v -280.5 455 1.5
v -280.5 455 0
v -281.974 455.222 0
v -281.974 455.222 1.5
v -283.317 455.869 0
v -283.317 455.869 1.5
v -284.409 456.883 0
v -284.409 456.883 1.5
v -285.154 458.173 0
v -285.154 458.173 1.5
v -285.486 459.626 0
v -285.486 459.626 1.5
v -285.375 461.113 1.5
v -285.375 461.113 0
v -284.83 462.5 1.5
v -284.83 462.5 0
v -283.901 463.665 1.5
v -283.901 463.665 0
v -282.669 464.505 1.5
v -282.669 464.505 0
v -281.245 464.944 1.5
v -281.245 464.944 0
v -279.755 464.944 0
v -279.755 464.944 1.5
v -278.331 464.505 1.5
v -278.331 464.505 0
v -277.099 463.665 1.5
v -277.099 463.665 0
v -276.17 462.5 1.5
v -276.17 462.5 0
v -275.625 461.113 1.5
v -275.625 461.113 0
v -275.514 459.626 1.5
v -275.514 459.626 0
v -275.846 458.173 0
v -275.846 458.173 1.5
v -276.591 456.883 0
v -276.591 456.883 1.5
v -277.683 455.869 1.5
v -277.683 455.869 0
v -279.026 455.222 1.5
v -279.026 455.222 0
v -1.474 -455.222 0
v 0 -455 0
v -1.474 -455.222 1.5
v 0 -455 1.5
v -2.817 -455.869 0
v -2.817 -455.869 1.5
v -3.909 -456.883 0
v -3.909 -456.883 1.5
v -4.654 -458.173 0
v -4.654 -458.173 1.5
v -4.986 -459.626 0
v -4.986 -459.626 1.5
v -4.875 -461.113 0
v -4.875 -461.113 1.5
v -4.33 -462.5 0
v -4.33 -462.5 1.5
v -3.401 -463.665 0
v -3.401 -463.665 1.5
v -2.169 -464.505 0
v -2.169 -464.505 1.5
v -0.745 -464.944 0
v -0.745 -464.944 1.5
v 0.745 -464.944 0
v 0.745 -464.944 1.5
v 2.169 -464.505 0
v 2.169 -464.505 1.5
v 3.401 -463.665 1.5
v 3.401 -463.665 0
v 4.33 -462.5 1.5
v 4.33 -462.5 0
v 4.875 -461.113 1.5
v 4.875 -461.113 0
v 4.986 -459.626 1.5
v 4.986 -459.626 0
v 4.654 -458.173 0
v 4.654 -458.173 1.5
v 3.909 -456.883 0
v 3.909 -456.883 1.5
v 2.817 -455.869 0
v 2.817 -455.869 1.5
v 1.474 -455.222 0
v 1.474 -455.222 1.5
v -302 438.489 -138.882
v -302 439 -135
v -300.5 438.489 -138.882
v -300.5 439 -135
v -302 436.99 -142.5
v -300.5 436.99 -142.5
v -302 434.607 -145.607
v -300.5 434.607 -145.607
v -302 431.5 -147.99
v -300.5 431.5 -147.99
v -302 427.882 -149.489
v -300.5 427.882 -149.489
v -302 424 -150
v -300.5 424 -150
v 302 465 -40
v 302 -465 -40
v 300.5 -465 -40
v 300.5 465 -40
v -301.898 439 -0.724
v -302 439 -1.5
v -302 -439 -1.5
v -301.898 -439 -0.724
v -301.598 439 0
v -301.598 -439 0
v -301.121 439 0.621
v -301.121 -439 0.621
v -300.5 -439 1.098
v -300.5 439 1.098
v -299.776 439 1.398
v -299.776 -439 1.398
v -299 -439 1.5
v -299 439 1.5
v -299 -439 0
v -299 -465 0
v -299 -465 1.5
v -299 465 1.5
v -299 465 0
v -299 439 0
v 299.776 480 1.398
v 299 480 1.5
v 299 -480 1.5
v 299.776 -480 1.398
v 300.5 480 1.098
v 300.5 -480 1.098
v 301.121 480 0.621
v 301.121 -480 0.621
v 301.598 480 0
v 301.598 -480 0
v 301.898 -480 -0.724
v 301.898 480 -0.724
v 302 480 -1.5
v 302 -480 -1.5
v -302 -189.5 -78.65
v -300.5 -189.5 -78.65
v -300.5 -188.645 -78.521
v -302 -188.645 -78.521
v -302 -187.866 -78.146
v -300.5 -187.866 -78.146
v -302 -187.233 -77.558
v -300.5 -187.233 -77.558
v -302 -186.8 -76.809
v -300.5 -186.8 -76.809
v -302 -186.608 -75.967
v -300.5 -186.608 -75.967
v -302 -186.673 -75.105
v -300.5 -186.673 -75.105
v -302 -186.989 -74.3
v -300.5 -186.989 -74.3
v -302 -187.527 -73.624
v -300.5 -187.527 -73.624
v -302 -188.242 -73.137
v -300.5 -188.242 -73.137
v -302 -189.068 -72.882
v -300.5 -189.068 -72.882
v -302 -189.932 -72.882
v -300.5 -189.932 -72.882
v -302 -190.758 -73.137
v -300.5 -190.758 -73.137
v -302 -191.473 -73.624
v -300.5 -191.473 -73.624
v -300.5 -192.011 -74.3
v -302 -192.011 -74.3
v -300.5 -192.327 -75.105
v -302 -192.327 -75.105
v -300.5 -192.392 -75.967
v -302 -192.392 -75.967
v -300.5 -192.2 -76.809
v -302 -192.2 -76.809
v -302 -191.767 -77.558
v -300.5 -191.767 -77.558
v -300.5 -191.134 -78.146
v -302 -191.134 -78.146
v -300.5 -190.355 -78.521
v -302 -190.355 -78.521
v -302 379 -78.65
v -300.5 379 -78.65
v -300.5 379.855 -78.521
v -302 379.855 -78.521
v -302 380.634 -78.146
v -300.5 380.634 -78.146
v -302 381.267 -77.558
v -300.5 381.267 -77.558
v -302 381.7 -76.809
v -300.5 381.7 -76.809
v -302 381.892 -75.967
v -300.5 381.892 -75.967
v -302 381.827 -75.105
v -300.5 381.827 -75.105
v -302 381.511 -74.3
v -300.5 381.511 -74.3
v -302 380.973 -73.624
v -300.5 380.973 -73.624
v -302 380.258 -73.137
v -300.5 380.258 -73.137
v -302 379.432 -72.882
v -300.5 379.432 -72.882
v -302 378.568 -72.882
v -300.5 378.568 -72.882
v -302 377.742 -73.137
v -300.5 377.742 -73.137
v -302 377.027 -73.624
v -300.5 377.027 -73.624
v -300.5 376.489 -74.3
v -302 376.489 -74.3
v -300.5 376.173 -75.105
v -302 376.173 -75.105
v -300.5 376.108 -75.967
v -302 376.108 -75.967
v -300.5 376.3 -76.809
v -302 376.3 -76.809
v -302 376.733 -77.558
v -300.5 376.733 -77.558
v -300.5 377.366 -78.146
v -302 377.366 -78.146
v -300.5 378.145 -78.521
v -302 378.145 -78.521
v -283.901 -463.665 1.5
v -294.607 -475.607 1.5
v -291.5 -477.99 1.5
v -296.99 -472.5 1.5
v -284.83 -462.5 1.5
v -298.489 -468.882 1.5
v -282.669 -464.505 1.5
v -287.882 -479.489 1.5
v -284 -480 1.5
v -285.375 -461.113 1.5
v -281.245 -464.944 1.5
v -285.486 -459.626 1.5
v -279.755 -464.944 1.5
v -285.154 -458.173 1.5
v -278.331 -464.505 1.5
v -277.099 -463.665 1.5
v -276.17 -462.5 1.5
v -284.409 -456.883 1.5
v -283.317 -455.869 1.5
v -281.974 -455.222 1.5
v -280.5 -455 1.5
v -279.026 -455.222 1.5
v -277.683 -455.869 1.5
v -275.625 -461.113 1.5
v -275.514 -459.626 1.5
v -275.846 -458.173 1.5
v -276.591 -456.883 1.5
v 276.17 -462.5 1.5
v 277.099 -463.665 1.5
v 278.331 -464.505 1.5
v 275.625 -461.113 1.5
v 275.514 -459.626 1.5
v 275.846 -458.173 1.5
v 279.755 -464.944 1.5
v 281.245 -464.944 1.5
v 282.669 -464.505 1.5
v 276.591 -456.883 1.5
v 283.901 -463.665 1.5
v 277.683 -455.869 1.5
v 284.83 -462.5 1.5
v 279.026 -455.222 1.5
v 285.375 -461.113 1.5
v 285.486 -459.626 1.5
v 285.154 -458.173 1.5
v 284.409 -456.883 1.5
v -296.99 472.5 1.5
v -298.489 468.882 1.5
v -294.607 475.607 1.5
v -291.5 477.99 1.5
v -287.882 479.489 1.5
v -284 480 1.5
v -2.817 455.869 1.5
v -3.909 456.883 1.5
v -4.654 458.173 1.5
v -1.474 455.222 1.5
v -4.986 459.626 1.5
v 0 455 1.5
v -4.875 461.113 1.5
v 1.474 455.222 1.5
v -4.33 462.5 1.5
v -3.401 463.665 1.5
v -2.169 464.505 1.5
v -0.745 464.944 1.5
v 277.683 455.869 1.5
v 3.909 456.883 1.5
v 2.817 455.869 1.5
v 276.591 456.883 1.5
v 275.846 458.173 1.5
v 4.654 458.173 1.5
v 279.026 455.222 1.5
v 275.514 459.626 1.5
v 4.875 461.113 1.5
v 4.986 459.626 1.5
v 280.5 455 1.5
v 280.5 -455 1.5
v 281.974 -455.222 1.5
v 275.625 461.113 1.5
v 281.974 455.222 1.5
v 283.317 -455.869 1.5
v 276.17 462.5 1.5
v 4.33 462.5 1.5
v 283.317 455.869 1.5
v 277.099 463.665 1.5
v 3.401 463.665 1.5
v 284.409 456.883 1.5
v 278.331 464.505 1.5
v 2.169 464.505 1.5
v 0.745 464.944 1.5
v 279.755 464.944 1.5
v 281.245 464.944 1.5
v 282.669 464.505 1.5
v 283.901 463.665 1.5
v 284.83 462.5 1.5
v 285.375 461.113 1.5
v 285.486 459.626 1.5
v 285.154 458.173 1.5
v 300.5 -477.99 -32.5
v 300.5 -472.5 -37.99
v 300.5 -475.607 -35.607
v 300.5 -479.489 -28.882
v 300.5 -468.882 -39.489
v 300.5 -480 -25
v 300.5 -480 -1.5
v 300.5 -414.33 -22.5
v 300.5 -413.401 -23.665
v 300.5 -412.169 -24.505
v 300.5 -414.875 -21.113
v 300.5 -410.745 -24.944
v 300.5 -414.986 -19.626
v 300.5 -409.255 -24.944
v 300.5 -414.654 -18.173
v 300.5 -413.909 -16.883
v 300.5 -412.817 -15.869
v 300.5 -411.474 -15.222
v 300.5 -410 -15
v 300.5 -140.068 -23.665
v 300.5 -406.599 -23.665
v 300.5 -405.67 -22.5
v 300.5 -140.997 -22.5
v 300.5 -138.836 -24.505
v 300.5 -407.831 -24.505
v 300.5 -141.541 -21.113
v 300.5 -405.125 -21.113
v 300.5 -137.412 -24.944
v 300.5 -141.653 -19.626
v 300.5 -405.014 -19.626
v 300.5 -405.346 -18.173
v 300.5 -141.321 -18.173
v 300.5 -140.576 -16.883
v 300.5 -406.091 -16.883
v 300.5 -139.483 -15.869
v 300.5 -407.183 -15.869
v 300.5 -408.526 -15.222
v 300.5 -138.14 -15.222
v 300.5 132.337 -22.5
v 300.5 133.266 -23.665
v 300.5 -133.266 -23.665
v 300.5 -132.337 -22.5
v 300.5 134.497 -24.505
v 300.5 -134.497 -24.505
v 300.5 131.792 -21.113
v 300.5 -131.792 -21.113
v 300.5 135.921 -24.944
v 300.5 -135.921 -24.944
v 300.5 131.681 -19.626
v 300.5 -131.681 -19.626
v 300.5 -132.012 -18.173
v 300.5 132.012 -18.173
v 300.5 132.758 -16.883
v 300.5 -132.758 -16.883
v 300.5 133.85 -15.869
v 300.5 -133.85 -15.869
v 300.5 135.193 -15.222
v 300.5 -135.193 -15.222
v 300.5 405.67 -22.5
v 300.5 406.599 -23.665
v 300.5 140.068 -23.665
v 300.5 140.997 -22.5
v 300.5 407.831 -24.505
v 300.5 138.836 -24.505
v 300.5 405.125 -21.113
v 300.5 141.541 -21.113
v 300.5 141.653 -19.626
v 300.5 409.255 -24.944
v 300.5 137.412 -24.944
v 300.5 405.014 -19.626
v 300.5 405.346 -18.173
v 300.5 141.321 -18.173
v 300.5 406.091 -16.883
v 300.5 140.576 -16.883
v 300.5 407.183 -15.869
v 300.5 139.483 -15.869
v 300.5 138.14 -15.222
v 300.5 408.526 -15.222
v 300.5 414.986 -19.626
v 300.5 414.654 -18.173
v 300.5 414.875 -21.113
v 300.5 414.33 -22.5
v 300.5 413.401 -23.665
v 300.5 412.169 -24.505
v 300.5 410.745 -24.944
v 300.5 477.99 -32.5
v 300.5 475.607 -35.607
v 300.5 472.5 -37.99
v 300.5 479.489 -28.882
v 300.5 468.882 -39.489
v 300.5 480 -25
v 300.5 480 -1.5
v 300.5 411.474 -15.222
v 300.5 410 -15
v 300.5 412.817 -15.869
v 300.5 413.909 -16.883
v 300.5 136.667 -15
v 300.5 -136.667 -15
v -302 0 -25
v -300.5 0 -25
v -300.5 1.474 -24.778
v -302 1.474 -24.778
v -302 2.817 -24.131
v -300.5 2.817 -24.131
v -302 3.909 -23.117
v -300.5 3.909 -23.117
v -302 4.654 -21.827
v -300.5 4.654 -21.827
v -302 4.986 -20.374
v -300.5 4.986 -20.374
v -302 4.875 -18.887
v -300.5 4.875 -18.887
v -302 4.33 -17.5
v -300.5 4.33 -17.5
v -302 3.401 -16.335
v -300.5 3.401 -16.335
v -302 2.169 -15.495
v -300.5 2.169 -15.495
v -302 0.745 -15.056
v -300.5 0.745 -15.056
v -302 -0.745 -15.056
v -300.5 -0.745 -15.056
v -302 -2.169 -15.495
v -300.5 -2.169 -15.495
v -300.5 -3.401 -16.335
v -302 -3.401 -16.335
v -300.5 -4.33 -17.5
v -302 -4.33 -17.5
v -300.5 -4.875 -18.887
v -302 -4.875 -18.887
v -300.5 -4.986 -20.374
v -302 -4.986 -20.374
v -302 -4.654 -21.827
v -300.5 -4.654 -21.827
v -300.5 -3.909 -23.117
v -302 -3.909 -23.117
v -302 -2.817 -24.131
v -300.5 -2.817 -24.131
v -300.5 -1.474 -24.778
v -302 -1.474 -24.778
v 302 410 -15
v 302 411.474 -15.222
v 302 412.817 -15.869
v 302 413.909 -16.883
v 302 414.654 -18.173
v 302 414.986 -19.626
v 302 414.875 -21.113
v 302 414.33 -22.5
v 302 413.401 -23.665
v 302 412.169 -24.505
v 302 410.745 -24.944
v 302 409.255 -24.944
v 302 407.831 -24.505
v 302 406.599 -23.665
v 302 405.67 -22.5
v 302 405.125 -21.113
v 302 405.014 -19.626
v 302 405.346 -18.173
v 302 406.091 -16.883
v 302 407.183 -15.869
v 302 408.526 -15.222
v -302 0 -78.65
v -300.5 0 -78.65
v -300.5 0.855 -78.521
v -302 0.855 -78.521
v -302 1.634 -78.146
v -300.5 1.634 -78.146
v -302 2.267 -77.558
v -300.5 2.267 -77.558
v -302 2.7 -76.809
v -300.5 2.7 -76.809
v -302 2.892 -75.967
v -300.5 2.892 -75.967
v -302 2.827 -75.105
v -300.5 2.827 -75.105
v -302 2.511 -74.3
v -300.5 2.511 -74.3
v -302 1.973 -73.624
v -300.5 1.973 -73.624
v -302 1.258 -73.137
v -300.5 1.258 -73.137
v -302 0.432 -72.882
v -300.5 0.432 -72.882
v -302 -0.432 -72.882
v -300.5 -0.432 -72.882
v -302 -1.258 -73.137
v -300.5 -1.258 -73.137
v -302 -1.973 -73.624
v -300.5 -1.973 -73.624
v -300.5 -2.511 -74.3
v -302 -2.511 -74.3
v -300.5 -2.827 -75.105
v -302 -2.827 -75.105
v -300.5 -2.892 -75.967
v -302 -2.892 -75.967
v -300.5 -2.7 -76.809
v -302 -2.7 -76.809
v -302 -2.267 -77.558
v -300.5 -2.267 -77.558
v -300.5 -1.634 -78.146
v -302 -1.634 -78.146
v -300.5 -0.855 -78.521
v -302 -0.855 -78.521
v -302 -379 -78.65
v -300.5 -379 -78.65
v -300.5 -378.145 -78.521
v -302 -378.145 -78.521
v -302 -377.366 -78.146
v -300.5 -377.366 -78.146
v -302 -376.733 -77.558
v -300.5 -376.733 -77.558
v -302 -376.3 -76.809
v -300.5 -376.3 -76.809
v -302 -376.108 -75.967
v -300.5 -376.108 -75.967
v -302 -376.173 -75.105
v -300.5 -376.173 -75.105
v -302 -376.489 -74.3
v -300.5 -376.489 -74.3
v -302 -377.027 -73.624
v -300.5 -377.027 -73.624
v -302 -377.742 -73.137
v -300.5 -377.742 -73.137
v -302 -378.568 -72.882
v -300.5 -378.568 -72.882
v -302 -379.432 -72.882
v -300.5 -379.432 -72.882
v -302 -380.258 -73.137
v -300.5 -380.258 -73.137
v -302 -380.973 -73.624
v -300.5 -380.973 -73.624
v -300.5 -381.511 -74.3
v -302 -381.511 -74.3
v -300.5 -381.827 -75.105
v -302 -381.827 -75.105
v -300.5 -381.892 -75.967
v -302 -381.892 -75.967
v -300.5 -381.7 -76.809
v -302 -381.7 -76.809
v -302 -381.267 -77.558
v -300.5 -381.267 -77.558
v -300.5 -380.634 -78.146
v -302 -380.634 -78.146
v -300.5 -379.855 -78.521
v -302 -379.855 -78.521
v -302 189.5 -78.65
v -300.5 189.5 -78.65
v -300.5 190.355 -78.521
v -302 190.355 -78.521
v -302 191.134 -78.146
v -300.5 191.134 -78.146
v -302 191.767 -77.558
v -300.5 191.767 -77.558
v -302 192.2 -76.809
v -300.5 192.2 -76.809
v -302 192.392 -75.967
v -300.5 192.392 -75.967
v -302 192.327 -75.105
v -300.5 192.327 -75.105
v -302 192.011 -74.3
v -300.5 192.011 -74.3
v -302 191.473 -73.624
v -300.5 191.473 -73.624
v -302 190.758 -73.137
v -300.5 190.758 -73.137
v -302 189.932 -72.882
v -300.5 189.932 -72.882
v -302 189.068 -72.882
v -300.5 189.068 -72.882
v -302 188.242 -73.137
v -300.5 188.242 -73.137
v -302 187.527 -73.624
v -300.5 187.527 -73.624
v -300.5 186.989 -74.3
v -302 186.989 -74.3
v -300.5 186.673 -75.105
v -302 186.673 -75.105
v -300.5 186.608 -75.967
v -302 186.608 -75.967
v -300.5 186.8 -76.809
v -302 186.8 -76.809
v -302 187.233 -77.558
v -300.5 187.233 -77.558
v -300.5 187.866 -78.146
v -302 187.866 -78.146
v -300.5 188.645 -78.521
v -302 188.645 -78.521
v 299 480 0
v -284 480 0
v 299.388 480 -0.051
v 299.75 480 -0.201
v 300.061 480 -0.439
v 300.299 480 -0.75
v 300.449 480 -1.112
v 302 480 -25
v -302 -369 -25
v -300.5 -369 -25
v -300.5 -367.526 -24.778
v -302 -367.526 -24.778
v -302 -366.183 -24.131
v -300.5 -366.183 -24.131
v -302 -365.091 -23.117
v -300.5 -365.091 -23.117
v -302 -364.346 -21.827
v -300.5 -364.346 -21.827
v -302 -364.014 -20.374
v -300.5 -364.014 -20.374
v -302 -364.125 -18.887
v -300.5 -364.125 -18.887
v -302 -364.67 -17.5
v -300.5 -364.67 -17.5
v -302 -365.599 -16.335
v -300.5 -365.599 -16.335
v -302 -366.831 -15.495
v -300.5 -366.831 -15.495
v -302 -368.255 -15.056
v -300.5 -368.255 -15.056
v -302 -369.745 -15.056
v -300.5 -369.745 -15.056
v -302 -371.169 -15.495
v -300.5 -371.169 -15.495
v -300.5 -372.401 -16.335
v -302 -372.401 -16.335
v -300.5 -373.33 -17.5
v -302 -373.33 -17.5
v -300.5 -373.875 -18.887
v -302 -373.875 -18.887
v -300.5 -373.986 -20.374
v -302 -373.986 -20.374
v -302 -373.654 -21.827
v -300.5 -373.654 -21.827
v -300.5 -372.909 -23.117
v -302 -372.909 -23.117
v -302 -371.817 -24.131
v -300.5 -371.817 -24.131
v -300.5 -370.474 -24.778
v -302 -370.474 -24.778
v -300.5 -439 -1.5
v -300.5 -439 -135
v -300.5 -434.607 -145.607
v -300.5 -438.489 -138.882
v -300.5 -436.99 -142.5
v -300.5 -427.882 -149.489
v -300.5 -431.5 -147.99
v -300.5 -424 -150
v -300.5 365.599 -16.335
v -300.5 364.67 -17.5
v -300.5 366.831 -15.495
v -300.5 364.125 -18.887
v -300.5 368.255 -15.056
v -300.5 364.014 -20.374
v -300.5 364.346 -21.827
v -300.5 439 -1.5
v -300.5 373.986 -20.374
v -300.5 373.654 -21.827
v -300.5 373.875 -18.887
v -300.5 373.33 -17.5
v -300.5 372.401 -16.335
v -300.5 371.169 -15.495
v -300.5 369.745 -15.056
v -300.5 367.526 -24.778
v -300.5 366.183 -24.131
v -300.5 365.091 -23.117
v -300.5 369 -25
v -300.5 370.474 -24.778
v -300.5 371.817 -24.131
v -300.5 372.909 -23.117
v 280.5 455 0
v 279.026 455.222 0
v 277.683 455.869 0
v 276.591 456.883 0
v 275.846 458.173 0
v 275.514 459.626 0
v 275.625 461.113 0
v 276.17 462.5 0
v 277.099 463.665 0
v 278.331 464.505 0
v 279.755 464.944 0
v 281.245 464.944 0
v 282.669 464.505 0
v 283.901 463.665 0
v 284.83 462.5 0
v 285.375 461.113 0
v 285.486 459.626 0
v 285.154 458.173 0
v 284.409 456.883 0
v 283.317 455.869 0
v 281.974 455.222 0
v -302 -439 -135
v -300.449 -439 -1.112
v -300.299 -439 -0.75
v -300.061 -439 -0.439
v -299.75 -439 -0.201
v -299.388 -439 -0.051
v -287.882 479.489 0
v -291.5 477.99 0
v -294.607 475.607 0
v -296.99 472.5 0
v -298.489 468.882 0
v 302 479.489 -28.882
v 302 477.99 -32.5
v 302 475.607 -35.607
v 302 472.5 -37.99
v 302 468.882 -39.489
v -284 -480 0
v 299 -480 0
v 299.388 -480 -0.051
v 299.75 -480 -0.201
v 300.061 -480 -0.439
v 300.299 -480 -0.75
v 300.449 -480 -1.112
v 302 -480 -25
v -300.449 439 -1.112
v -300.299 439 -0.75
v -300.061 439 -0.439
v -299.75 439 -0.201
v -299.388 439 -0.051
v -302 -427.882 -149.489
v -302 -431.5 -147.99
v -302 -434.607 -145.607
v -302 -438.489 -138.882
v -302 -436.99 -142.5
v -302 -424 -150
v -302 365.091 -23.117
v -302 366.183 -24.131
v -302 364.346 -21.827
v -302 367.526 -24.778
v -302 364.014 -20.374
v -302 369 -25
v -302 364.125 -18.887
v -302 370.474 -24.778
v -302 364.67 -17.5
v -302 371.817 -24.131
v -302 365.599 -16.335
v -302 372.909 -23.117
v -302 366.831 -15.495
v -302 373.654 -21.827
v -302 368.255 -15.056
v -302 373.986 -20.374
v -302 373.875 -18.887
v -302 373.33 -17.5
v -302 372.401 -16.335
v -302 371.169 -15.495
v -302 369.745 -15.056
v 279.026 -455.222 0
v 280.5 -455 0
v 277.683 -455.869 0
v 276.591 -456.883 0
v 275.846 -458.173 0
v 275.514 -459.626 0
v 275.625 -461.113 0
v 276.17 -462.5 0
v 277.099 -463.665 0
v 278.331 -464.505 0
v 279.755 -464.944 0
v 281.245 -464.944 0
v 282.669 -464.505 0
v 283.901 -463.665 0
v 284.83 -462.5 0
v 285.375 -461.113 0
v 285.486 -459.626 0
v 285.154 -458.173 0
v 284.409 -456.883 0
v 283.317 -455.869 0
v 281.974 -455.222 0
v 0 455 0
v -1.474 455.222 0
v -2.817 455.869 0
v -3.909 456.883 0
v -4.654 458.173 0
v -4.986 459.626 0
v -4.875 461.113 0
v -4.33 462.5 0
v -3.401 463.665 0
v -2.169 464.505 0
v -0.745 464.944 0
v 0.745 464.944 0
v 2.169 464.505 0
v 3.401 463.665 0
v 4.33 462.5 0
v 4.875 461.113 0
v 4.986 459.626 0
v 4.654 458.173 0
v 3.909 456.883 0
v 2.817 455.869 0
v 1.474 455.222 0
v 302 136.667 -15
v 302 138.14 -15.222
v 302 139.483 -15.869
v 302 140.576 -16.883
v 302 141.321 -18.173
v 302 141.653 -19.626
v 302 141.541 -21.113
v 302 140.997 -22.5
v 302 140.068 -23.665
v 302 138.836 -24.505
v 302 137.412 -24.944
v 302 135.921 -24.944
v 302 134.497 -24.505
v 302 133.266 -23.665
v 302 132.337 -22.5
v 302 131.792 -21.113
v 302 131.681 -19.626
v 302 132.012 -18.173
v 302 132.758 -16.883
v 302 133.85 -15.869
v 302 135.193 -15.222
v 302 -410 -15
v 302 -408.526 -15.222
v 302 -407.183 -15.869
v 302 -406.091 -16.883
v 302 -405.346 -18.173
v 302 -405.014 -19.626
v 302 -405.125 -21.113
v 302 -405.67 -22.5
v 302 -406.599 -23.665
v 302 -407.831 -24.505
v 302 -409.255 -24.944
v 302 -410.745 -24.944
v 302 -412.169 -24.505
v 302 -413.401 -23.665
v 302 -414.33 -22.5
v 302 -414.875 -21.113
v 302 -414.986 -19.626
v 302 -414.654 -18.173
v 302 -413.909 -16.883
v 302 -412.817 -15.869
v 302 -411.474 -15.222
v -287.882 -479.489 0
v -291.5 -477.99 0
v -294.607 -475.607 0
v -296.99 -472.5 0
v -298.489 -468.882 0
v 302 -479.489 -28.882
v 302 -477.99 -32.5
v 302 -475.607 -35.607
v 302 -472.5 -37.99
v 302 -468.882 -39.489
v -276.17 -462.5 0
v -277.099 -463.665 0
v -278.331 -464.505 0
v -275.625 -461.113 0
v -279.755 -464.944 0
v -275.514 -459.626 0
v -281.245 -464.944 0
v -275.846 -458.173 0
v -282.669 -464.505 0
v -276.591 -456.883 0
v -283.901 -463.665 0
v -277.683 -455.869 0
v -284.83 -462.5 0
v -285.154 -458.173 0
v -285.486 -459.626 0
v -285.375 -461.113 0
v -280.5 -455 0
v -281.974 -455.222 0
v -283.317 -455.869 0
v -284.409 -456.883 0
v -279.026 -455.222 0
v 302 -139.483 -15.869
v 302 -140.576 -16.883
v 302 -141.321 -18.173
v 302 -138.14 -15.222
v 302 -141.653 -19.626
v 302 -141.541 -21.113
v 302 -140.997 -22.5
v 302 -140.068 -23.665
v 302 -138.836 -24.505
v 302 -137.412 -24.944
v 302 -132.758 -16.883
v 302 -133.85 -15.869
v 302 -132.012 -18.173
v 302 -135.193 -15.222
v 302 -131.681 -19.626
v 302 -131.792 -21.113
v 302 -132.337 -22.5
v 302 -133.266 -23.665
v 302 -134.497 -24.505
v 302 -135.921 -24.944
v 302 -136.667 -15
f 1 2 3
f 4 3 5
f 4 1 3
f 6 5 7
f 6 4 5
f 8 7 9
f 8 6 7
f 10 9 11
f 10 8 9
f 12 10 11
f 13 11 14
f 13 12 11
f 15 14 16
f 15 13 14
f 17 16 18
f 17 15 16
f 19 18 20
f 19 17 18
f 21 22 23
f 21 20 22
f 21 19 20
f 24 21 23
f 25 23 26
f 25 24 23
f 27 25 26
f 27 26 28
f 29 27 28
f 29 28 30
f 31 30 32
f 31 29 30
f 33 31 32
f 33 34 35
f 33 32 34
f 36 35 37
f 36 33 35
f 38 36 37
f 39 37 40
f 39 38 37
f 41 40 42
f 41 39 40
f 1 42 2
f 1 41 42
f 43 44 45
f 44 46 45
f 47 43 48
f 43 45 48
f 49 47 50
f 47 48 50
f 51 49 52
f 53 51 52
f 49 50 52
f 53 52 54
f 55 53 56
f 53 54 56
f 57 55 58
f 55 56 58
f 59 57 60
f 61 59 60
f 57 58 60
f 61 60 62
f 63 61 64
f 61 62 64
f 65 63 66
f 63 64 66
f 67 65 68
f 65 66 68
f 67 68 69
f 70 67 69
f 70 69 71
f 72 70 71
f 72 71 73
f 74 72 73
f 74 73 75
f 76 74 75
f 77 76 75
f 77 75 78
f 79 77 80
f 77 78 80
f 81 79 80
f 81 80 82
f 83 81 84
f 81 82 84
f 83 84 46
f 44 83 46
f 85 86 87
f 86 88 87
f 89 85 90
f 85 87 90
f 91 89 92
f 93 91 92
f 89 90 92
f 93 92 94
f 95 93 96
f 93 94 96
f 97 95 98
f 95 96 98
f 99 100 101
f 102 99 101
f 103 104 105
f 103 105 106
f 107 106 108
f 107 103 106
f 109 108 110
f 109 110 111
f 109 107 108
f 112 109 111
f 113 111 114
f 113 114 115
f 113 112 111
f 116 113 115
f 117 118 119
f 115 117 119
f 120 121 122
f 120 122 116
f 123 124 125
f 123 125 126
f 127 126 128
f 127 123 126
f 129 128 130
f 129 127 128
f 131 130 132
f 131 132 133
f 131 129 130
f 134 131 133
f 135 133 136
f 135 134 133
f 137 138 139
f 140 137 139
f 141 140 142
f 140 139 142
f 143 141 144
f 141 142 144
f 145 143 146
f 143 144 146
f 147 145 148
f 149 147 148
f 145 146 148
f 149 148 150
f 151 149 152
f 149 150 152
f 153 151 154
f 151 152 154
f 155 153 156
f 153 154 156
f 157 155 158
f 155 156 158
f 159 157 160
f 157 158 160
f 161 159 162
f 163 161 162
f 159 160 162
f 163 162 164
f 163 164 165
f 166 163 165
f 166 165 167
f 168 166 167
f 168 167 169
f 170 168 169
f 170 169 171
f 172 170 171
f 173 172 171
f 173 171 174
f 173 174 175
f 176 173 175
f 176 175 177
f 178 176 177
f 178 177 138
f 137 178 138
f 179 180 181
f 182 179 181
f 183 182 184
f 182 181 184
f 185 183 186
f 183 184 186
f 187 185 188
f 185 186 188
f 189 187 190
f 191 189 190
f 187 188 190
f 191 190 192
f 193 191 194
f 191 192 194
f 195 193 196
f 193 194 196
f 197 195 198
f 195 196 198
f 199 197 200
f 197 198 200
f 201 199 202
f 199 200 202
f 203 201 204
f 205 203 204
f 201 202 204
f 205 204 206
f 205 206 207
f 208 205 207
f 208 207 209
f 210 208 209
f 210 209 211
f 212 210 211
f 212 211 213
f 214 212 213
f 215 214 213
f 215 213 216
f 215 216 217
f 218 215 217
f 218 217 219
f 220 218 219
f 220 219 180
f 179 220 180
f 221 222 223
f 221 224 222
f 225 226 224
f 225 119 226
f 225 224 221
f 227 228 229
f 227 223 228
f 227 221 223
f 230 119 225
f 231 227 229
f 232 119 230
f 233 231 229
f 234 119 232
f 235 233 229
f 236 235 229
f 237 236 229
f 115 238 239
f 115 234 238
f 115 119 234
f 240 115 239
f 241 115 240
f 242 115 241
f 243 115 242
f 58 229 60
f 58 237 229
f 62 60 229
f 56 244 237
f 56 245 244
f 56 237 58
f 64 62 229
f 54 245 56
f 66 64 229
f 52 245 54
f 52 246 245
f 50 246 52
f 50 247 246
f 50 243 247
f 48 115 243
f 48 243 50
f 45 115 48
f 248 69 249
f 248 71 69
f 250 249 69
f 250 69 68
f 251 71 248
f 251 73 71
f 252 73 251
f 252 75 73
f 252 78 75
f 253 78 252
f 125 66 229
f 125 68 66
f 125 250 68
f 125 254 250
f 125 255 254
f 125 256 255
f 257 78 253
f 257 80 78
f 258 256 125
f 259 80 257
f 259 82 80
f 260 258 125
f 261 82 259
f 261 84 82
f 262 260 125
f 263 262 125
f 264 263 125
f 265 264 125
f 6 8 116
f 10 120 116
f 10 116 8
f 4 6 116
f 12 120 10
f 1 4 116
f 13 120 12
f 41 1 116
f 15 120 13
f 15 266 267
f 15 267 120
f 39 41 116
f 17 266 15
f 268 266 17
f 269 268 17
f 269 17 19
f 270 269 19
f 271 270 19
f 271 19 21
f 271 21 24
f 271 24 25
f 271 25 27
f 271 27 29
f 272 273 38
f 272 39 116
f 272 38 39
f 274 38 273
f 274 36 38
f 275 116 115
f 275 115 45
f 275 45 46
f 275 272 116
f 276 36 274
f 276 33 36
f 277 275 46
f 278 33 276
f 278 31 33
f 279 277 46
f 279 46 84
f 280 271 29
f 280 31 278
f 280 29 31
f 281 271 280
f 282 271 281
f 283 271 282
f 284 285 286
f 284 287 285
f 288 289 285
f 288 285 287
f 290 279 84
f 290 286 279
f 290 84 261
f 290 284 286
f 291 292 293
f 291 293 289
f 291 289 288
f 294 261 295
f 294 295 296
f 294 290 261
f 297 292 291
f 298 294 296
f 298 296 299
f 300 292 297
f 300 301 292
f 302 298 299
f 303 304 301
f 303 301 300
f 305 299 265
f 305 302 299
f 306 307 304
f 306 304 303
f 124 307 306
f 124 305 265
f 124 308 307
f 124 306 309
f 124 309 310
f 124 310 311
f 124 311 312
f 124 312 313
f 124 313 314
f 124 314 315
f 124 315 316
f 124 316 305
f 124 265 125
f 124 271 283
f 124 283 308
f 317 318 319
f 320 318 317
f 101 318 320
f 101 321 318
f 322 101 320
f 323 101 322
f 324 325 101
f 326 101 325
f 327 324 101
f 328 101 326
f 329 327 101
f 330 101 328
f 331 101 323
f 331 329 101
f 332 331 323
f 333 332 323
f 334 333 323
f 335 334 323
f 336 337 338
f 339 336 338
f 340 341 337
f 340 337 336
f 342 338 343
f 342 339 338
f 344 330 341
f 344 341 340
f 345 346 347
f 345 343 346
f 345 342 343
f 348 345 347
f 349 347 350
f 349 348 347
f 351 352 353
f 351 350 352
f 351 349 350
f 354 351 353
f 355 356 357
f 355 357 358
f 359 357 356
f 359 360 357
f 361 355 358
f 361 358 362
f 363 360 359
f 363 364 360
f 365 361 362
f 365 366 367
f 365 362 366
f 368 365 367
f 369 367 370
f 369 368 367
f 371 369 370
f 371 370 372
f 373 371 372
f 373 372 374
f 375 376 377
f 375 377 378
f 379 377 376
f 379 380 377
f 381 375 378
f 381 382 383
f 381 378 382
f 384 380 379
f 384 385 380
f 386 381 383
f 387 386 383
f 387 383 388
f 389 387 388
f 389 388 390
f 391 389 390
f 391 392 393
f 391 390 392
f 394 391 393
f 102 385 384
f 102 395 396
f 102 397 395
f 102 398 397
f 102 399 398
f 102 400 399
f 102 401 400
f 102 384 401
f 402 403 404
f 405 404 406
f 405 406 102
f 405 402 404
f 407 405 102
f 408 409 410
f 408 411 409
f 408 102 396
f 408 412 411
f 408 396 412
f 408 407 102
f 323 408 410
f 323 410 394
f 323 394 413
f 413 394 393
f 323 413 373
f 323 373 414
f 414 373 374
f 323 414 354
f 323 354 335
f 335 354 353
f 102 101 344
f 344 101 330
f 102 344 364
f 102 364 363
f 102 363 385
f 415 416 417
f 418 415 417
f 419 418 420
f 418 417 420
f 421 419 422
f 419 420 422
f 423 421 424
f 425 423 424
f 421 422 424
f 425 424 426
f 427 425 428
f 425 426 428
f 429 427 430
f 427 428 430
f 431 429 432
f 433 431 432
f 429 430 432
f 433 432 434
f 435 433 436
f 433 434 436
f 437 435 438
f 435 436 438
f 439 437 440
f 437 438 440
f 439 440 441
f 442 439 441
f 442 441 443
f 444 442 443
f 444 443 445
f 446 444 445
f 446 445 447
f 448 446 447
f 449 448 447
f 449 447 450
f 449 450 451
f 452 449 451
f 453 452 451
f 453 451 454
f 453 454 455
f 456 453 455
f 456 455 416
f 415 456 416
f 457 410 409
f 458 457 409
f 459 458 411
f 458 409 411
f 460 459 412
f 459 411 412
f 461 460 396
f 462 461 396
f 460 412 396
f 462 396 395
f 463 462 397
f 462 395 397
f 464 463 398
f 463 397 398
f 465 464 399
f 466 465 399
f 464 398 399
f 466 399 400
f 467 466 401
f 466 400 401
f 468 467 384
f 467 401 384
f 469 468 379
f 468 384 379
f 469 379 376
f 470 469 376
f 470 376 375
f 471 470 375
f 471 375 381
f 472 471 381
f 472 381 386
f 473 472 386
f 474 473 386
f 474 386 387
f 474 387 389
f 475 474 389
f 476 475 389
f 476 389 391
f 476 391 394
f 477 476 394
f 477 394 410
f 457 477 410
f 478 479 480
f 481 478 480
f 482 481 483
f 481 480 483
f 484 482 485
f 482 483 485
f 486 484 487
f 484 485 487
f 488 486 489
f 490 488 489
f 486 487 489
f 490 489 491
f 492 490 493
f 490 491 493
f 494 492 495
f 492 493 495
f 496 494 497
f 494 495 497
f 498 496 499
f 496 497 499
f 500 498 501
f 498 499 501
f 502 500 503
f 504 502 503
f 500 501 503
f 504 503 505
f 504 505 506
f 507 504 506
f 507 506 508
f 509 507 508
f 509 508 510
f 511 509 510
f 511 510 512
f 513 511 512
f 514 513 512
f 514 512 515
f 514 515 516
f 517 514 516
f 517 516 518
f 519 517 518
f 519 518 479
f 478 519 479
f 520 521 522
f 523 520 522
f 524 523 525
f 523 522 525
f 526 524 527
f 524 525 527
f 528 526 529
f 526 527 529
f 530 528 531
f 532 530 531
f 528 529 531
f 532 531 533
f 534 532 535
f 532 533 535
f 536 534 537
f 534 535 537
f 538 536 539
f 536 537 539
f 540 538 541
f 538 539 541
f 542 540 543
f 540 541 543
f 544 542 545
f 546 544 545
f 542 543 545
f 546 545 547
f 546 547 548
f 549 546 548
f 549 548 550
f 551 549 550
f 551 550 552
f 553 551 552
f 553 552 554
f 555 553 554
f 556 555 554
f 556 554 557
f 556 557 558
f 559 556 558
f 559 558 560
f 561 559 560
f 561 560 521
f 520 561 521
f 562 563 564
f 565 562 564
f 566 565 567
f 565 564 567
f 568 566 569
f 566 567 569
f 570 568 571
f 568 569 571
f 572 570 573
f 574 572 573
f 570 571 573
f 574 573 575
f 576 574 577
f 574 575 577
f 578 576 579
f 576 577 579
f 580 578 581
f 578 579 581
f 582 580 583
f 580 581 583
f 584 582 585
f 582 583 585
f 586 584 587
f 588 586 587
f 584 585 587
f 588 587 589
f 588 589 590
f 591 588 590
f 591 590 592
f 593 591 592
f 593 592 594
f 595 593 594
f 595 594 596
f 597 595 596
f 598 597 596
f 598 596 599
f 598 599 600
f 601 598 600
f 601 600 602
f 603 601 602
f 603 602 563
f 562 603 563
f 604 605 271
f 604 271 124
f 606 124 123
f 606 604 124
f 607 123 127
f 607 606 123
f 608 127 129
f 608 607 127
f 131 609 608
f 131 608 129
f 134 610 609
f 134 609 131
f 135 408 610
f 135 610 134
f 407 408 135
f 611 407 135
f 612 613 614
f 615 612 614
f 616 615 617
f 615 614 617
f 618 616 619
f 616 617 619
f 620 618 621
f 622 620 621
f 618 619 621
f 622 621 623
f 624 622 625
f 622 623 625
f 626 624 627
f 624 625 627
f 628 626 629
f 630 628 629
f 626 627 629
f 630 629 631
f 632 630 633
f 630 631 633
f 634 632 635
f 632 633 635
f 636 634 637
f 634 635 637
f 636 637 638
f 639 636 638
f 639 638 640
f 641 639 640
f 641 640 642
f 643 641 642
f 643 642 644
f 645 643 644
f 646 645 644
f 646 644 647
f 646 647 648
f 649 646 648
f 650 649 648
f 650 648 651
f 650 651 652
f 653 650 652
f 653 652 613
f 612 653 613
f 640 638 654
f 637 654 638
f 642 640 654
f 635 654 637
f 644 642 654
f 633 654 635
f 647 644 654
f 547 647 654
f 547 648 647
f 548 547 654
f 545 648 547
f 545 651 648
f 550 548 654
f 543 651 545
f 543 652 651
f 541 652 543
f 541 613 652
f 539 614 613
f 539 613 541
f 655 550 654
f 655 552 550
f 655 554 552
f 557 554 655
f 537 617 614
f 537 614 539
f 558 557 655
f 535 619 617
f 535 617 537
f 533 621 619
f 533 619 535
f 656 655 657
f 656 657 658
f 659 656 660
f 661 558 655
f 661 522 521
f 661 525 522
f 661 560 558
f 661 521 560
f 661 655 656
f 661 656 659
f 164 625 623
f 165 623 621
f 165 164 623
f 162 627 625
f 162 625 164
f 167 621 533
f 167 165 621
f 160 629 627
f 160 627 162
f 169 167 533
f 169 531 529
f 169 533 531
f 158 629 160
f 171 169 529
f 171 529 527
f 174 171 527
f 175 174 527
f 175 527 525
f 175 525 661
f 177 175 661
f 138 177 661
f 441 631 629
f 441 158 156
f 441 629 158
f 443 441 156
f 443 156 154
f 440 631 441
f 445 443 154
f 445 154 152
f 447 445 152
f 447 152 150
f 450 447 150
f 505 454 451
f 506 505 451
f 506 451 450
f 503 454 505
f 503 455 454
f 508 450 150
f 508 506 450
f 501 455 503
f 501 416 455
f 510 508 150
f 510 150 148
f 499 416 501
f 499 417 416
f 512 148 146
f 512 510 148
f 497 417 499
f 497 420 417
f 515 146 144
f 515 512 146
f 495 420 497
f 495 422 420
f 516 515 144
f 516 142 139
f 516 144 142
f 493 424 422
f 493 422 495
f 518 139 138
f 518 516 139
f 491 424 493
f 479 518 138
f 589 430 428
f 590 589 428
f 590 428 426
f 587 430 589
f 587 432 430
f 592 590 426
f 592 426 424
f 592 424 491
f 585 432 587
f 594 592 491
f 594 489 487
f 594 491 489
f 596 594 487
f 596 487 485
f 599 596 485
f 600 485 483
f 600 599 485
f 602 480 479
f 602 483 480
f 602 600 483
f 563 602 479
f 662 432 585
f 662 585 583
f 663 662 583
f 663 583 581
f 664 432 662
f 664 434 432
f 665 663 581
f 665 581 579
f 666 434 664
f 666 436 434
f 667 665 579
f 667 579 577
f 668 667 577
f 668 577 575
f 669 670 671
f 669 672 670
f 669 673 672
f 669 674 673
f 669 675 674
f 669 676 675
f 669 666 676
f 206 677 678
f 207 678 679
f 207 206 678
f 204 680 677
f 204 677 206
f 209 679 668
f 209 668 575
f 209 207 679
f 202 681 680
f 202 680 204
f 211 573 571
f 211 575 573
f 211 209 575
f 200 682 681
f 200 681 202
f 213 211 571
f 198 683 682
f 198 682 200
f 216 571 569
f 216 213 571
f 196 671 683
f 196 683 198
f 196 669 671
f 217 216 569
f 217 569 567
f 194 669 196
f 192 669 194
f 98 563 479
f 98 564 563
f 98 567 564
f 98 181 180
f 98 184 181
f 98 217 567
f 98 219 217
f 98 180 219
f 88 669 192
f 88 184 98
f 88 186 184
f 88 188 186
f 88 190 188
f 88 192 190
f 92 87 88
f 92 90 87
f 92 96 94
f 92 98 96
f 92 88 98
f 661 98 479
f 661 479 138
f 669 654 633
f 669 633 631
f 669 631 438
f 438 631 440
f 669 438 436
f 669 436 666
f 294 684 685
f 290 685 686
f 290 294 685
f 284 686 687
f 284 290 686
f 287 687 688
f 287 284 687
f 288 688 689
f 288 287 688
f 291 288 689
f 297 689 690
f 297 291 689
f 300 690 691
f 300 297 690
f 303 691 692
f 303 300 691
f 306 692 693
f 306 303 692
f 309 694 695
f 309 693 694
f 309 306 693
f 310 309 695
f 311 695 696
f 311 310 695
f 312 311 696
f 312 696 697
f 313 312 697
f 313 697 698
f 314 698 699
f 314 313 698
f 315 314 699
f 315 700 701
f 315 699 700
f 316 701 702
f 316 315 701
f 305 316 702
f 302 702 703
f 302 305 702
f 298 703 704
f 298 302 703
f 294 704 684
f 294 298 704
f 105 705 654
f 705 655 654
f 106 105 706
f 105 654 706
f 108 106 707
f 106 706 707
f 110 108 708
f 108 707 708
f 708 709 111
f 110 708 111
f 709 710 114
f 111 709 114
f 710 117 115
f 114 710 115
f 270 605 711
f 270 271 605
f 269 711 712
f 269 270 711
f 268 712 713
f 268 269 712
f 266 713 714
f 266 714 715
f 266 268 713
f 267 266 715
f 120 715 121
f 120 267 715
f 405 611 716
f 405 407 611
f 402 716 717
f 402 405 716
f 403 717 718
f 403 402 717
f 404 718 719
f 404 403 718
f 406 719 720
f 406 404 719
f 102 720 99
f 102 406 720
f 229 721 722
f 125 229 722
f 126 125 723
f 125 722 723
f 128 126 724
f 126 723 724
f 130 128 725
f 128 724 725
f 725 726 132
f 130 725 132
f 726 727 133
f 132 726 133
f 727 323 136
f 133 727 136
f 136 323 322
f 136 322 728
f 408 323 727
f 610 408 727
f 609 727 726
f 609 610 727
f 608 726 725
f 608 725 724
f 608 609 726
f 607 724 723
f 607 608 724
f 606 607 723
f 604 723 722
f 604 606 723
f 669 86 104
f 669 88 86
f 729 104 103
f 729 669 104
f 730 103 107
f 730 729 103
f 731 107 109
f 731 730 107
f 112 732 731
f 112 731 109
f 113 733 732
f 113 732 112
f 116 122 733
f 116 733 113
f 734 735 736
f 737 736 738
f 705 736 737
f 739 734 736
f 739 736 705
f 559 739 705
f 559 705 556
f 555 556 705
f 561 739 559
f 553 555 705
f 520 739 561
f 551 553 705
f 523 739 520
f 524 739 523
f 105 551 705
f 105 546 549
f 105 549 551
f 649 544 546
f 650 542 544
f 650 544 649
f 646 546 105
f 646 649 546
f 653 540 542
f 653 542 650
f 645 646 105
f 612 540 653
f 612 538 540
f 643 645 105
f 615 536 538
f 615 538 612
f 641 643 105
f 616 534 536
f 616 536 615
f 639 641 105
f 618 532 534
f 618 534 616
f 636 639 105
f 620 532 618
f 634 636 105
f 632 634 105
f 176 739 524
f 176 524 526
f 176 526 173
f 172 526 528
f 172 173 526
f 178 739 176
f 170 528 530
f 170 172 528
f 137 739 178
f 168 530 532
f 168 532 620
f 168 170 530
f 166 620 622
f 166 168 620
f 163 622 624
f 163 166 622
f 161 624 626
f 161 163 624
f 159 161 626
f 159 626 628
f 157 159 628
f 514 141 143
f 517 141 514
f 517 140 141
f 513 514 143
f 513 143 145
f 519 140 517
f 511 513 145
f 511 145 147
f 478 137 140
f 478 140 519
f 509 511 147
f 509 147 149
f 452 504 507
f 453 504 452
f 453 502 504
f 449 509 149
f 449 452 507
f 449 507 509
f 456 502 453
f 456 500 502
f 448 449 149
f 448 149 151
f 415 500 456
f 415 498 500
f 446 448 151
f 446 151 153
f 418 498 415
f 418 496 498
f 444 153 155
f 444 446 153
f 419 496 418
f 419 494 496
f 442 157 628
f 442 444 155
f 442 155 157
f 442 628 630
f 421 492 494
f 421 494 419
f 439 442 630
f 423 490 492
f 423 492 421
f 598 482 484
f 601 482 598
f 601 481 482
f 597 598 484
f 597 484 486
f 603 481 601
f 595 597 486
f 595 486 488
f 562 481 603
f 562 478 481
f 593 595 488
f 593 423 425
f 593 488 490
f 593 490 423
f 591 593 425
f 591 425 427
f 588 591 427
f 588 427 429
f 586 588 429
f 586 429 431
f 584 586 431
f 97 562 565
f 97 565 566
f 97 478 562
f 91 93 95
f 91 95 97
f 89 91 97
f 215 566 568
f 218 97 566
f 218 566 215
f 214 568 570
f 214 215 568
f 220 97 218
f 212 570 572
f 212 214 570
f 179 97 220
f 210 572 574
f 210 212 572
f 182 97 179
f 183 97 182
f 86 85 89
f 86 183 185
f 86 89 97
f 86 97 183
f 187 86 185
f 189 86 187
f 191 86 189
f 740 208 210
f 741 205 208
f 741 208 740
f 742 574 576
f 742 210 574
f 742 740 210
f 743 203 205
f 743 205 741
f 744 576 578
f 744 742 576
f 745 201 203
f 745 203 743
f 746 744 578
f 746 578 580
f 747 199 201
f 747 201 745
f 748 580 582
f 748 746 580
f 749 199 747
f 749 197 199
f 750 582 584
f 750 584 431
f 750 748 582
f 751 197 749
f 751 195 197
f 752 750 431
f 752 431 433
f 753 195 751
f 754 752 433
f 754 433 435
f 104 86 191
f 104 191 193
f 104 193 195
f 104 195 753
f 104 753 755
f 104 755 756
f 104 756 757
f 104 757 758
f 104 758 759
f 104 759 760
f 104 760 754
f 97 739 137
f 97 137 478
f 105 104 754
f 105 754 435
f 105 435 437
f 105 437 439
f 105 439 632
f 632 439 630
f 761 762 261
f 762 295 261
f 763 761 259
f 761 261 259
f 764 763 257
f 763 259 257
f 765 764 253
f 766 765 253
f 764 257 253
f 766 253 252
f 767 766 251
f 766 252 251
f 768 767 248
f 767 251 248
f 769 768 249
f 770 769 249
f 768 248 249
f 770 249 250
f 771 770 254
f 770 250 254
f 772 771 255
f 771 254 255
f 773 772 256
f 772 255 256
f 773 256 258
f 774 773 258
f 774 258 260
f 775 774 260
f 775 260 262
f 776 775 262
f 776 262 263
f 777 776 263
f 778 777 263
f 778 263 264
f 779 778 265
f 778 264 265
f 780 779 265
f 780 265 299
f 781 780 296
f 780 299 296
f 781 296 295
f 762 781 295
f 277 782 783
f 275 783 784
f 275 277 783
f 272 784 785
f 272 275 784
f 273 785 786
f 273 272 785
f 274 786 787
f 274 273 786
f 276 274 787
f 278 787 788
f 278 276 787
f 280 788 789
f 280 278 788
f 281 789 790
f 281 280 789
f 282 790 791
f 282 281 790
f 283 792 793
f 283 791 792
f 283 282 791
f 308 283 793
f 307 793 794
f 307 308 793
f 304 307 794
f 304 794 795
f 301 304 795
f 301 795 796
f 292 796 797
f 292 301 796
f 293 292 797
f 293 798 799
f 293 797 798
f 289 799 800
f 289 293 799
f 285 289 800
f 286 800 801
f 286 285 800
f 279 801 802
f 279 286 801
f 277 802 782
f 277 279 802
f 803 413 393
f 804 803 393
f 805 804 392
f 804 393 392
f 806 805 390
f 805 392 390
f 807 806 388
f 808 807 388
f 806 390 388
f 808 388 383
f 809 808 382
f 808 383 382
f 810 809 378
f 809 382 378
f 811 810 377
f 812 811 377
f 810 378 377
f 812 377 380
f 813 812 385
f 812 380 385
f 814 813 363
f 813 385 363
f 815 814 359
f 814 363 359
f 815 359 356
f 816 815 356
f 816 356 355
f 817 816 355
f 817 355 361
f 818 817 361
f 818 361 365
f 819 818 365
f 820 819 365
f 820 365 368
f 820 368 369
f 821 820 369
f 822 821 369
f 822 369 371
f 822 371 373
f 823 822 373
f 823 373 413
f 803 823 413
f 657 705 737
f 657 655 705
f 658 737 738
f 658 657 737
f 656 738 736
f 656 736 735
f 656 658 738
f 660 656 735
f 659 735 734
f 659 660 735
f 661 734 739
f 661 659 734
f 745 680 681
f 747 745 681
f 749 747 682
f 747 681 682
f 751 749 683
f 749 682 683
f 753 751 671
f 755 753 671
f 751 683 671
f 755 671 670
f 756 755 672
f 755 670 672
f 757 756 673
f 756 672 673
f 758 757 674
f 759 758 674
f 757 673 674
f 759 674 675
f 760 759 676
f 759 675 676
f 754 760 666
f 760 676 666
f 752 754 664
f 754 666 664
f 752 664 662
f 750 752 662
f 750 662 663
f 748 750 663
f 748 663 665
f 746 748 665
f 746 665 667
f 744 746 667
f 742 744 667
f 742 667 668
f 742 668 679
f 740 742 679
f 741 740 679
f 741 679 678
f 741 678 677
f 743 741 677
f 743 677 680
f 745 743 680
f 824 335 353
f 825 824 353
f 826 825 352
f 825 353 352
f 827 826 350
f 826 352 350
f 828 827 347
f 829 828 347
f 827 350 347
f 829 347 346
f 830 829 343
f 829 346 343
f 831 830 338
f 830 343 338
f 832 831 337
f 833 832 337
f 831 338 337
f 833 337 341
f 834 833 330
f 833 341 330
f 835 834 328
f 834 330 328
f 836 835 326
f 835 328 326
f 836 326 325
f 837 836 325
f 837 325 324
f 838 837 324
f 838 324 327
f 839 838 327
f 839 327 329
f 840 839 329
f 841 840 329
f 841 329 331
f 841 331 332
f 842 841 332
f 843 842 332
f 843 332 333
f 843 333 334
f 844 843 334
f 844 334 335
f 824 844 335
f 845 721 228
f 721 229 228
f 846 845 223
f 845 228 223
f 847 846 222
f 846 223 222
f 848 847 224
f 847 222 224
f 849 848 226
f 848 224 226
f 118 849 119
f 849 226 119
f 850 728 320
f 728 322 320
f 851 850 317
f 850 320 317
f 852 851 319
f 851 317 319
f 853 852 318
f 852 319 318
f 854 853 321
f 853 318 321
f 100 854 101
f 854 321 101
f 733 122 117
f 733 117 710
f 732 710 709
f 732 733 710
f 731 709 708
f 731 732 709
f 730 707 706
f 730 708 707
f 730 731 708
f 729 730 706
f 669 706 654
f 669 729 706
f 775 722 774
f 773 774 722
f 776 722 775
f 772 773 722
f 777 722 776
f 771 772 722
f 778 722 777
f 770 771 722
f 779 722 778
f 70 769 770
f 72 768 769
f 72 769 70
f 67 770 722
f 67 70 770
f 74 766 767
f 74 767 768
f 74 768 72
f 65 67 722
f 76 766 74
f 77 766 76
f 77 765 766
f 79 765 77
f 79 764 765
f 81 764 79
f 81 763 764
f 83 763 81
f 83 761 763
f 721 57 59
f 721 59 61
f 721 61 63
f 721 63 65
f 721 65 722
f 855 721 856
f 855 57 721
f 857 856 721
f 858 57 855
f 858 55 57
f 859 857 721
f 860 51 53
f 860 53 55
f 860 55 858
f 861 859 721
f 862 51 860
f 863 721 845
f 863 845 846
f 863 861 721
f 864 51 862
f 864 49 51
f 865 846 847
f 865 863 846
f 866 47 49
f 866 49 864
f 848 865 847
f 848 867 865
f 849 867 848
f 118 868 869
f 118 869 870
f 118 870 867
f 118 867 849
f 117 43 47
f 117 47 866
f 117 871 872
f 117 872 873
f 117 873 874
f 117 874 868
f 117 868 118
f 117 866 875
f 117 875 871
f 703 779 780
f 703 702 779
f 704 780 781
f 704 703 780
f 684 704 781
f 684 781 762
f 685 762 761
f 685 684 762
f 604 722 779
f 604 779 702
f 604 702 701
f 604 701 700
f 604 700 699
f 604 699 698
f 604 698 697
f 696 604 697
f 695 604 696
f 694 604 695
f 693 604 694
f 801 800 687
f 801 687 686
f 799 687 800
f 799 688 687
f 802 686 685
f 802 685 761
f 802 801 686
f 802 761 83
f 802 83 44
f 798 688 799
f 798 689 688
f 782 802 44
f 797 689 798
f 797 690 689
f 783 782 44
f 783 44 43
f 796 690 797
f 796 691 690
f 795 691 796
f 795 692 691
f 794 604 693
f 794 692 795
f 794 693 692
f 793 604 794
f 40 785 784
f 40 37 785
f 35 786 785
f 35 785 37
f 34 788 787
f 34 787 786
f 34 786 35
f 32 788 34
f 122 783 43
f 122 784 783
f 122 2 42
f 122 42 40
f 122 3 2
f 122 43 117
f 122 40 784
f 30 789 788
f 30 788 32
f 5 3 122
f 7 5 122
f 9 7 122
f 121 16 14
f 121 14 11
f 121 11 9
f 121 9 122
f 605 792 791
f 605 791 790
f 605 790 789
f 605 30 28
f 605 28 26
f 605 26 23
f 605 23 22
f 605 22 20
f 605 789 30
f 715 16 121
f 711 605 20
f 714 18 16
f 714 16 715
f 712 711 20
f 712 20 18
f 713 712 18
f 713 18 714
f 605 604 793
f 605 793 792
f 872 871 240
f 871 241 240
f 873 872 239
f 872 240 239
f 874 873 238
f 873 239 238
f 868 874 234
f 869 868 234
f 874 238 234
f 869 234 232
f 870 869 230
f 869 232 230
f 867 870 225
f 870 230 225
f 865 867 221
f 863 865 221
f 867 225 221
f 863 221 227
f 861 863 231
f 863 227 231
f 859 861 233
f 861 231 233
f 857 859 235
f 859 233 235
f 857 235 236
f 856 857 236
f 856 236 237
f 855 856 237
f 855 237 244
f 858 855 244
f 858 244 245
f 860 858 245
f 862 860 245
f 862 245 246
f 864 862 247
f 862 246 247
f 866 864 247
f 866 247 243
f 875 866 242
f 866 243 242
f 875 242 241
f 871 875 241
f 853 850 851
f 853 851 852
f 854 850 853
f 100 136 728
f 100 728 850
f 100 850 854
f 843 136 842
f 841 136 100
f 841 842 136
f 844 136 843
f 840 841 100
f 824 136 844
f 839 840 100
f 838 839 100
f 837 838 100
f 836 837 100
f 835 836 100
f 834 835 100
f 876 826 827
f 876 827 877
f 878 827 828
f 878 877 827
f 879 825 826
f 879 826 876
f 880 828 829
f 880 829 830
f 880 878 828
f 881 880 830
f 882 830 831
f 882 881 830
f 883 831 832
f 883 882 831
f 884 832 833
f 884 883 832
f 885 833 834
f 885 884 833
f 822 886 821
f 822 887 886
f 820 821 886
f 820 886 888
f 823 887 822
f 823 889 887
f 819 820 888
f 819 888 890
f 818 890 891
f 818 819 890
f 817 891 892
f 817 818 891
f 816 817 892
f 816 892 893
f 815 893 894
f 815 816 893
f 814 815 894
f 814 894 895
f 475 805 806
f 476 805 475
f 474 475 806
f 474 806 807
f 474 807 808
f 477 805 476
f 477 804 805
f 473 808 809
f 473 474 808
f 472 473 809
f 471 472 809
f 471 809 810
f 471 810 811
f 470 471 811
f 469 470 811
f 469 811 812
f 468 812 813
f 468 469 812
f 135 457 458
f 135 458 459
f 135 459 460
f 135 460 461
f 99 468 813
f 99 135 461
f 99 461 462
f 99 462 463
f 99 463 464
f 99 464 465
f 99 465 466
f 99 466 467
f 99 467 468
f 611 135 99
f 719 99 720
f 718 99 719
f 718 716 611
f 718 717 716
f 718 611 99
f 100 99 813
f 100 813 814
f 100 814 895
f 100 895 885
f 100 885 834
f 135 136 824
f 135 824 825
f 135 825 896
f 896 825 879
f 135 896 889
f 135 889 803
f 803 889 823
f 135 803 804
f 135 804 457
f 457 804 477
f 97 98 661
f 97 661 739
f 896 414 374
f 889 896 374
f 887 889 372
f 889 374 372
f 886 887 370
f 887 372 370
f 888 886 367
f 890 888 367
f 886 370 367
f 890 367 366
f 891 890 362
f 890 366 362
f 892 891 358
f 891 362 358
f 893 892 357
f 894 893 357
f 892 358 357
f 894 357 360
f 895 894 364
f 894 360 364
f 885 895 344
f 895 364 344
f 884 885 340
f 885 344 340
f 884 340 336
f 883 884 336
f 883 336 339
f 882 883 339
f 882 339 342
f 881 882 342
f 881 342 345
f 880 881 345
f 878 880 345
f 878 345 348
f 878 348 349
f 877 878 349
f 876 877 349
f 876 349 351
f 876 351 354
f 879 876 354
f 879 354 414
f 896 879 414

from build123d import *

# Parameters (mm, degrees)
BASE_FLANGE1_DEPTH            = 480
CUT_EXTRUDE1_START            = -3
SKETCH6_W                     = 170
SKETCH6_H                     = 41
CUT_EXTRUDE1_DEPTH            = 789.949107767
M5_CLEARANCE_HOLE1_D          = 5.8
FILLET1_R                     = 15
M8_CLEARANCE_HOLE1_AT_2_COUNT = 2
M8_CLEARANCE_HOLE1_AT_2_PITCH = 280.5
M8_CLEARANCE_HOLE1_AT_3_COUNT = 2
M8_CLEARANCE_HOLE1_AT_3_PITCH = 561
M8_CLEARANCE_HOLE2_D          = 10
M8_CLEARANCE_HOLE2_DEPTH      = 8.995696905
M8_CLEARANCE_HOLE2_TIP        = 3.004303095
M8_CLEARANCE_HOLE3_D          = 10
M8_CLEARANCE_HOLE3_DEPTH      = 8.995696905
M8_CLEARANCE_HOLE3_TIP        = 3.004303095


# Sheet-metal steps are written as plain solids
with BuildPart() as part:
    # Sketch1 → Base-Flange1 (new, symmetric)
    with BuildSketch(Plane(origin=(0, 0, 0), x_dir=(1, 0, 0), z_dir=(0, 1, 0))):
        with BuildLine():
            Line((300.5, 40), (300.5, 1.5))
            ThreePointArc((300.5, 1.5), (300.060660172, 0.439339828), (299, 0))
            Line((299, 0), (-299, 0))
            ThreePointArc((-299, 0), (-300.060660172, 0.439339828), (-300.5, 1.5))
            Line((-300.5, 1.5), (-300.5, 150))
            Line((-300.5, 150), (-302, 150))
            Line((-302, 150), (-302, 1.5))
            ThreePointArc((-302, 1.5), (-301.121320344, -0.621320344), (-299, -1.5))
            Line((-299, -1.5), (299, -1.5))
            ThreePointArc((299, -1.5), (301.121320344, -0.621320344), (302, 1.5))
            Line((302, 1.5), (302, 40))
            Line((302, 40), (300.5, 40))
        make_face()
    extrude(amount=BASE_FLANGE1_DEPTH, both=True)

    # Sketch6 → Cut-Extrude1 (cut)
    with BuildSketch(Plane.ZY.offset(302).offset(CUT_EXTRUDE1_START)):
        with Locations((-73.5, 459.5)):
            Rectangle(SKETCH6_W, SKETCH6_H)
    cut_extrude1 = extrude(amount=CUT_EXTRUDE1_DEPTH, mode=Mode.SUBTRACT)

    # Mirror1: Cut-Extrude1 across plane
    add(cut_extrude1.mirror(Plane.ZX), mode=Mode.SUBTRACT)

    # M5 Clearance Hole1 (through all)
    with Locations(Plane.ZY.offset(302)):
        with Locations((-75.75, -379), (-75.75, -189.5), (-75.75, 0), (-75.75, 189.5), (-75.75, 379)):
            Hole(M5_CLEARANCE_HOLE1_D / 2)

    # Fillet1
    fillet1_edges = [part.edges().sort_by_distance(p)[0] for p in [
        (301.25, -480, -40),
        (-299, -480, 0.75),
        (-299, 480, 0.75),
        (301.25, 480, -40),
        (-301.25, 439, -150),
        (-301.25, -439, -150),
    ]]
    fillet(fillet1_edges, radius=FILLET1_R)

    # Sketch10 → M8 Clearance Hole1 (revolve, cut)
    with BuildSketch(Plane(origin=(-280.5, 460, 1.5), x_dir=(0, -1, 0), z_dir=(1, 0, 0))):
        Polygon((0, 0), (0, 12), (5, 8.995696905), (5, 0), align=None)
    m8_clearance_hole1 = revolve(axis=Axis((-280.5, 460, 7.85), (0, 0, -1)), mode=Mode.SUBTRACT)

    # M8 Clearance Hole1 at 2: M8 Clearance Hole1 ×2
    with Locations(*[(i * M8_CLEARANCE_HOLE1_AT_2_PITCH, 0, 0) for i in range(1, M8_CLEARANCE_HOLE1_AT_2_COUNT)]):
        add(m8_clearance_hole1, mode=Mode.SUBTRACT)

    # M8 Clearance Hole1 at 3: M8 Clearance Hole1 ×2
    with Locations(*[(i * M8_CLEARANCE_HOLE1_AT_3_PITCH, 0, 0) for i in range(1, M8_CLEARANCE_HOLE1_AT_3_COUNT)]):
        add(m8_clearance_hole1, mode=Mode.SUBTRACT)

    # Mirror2: M8 Clearance Hole1 across plane
    add(m8_clearance_hole1.mirror(Plane.ZX), mode=Mode.SUBTRACT)

    # Mirror2 copy 1 sketch → Mirror2 copy 1 (revolve, cut)
    with BuildSketch(Plane(origin=(0, -460, 1.5), x_dir=(0, 1, 0), z_dir=(1, 0, 0))):
        Polygon((0, 0), (0, -12), (5, -8.995696905), (5, 0), align=None)
    revolve(axis=Axis((0, -460, 7.85), (0, 0, 1)), mode=Mode.SUBTRACT)

    # Mirror2 copy 2 sketch → Mirror2 copy 2 (revolve, cut)
    with BuildSketch(Plane(origin=(280.5, -460, 1.5), x_dir=(0, 1, 0), z_dir=(1, 0, 0))):
        Polygon((0, 0), (0, -12), (5, -8.995696905), (5, 0), align=None)
    revolve(axis=Axis((280.5, -460, 7.85), (0, 0, 1)), mode=Mode.SUBTRACT)

    # M8 Clearance Hole2
    with Locations(Plane(origin=(302, 0, 0), x_dir=(0, 0, -1), z_dir=(1, 0, 0))):
        with Locations((20, 410), (20, 136.666666667), (20, -136.666666667), (20, -410)):
            Hole(M8_CLEARANCE_HOLE2_D / 2, depth=M8_CLEARANCE_HOLE2_DEPTH)
            with Locations((0, 0, -(M8_CLEARANCE_HOLE2_DEPTH + M8_CLEARANCE_HOLE2_TIP / 2))):  # 118° drill point
                Cone(0, M8_CLEARANCE_HOLE2_D / 2, M8_CLEARANCE_HOLE2_TIP, mode=Mode.SUBTRACT)

    # M8 Clearance Hole3
    with Locations(Plane.ZY.offset(302)):
        with Locations((-20, 369), (-20, 0), (-20, -369)):
            Hole(M8_CLEARANCE_HOLE3_D / 2, depth=M8_CLEARANCE_HOLE3_DEPTH)
            with Locations((0, 0, -(M8_CLEARANCE_HOLE3_DEPTH + M8_CLEARANCE_HOLE3_TIP / 2))):  # 118° drill point
                Cone(0, M8_CLEARANCE_HOLE3_D / 2, M8_CLEARANCE_HOLE3_TIP, mode=Mode.SUBTRACT)


solid = part.part
